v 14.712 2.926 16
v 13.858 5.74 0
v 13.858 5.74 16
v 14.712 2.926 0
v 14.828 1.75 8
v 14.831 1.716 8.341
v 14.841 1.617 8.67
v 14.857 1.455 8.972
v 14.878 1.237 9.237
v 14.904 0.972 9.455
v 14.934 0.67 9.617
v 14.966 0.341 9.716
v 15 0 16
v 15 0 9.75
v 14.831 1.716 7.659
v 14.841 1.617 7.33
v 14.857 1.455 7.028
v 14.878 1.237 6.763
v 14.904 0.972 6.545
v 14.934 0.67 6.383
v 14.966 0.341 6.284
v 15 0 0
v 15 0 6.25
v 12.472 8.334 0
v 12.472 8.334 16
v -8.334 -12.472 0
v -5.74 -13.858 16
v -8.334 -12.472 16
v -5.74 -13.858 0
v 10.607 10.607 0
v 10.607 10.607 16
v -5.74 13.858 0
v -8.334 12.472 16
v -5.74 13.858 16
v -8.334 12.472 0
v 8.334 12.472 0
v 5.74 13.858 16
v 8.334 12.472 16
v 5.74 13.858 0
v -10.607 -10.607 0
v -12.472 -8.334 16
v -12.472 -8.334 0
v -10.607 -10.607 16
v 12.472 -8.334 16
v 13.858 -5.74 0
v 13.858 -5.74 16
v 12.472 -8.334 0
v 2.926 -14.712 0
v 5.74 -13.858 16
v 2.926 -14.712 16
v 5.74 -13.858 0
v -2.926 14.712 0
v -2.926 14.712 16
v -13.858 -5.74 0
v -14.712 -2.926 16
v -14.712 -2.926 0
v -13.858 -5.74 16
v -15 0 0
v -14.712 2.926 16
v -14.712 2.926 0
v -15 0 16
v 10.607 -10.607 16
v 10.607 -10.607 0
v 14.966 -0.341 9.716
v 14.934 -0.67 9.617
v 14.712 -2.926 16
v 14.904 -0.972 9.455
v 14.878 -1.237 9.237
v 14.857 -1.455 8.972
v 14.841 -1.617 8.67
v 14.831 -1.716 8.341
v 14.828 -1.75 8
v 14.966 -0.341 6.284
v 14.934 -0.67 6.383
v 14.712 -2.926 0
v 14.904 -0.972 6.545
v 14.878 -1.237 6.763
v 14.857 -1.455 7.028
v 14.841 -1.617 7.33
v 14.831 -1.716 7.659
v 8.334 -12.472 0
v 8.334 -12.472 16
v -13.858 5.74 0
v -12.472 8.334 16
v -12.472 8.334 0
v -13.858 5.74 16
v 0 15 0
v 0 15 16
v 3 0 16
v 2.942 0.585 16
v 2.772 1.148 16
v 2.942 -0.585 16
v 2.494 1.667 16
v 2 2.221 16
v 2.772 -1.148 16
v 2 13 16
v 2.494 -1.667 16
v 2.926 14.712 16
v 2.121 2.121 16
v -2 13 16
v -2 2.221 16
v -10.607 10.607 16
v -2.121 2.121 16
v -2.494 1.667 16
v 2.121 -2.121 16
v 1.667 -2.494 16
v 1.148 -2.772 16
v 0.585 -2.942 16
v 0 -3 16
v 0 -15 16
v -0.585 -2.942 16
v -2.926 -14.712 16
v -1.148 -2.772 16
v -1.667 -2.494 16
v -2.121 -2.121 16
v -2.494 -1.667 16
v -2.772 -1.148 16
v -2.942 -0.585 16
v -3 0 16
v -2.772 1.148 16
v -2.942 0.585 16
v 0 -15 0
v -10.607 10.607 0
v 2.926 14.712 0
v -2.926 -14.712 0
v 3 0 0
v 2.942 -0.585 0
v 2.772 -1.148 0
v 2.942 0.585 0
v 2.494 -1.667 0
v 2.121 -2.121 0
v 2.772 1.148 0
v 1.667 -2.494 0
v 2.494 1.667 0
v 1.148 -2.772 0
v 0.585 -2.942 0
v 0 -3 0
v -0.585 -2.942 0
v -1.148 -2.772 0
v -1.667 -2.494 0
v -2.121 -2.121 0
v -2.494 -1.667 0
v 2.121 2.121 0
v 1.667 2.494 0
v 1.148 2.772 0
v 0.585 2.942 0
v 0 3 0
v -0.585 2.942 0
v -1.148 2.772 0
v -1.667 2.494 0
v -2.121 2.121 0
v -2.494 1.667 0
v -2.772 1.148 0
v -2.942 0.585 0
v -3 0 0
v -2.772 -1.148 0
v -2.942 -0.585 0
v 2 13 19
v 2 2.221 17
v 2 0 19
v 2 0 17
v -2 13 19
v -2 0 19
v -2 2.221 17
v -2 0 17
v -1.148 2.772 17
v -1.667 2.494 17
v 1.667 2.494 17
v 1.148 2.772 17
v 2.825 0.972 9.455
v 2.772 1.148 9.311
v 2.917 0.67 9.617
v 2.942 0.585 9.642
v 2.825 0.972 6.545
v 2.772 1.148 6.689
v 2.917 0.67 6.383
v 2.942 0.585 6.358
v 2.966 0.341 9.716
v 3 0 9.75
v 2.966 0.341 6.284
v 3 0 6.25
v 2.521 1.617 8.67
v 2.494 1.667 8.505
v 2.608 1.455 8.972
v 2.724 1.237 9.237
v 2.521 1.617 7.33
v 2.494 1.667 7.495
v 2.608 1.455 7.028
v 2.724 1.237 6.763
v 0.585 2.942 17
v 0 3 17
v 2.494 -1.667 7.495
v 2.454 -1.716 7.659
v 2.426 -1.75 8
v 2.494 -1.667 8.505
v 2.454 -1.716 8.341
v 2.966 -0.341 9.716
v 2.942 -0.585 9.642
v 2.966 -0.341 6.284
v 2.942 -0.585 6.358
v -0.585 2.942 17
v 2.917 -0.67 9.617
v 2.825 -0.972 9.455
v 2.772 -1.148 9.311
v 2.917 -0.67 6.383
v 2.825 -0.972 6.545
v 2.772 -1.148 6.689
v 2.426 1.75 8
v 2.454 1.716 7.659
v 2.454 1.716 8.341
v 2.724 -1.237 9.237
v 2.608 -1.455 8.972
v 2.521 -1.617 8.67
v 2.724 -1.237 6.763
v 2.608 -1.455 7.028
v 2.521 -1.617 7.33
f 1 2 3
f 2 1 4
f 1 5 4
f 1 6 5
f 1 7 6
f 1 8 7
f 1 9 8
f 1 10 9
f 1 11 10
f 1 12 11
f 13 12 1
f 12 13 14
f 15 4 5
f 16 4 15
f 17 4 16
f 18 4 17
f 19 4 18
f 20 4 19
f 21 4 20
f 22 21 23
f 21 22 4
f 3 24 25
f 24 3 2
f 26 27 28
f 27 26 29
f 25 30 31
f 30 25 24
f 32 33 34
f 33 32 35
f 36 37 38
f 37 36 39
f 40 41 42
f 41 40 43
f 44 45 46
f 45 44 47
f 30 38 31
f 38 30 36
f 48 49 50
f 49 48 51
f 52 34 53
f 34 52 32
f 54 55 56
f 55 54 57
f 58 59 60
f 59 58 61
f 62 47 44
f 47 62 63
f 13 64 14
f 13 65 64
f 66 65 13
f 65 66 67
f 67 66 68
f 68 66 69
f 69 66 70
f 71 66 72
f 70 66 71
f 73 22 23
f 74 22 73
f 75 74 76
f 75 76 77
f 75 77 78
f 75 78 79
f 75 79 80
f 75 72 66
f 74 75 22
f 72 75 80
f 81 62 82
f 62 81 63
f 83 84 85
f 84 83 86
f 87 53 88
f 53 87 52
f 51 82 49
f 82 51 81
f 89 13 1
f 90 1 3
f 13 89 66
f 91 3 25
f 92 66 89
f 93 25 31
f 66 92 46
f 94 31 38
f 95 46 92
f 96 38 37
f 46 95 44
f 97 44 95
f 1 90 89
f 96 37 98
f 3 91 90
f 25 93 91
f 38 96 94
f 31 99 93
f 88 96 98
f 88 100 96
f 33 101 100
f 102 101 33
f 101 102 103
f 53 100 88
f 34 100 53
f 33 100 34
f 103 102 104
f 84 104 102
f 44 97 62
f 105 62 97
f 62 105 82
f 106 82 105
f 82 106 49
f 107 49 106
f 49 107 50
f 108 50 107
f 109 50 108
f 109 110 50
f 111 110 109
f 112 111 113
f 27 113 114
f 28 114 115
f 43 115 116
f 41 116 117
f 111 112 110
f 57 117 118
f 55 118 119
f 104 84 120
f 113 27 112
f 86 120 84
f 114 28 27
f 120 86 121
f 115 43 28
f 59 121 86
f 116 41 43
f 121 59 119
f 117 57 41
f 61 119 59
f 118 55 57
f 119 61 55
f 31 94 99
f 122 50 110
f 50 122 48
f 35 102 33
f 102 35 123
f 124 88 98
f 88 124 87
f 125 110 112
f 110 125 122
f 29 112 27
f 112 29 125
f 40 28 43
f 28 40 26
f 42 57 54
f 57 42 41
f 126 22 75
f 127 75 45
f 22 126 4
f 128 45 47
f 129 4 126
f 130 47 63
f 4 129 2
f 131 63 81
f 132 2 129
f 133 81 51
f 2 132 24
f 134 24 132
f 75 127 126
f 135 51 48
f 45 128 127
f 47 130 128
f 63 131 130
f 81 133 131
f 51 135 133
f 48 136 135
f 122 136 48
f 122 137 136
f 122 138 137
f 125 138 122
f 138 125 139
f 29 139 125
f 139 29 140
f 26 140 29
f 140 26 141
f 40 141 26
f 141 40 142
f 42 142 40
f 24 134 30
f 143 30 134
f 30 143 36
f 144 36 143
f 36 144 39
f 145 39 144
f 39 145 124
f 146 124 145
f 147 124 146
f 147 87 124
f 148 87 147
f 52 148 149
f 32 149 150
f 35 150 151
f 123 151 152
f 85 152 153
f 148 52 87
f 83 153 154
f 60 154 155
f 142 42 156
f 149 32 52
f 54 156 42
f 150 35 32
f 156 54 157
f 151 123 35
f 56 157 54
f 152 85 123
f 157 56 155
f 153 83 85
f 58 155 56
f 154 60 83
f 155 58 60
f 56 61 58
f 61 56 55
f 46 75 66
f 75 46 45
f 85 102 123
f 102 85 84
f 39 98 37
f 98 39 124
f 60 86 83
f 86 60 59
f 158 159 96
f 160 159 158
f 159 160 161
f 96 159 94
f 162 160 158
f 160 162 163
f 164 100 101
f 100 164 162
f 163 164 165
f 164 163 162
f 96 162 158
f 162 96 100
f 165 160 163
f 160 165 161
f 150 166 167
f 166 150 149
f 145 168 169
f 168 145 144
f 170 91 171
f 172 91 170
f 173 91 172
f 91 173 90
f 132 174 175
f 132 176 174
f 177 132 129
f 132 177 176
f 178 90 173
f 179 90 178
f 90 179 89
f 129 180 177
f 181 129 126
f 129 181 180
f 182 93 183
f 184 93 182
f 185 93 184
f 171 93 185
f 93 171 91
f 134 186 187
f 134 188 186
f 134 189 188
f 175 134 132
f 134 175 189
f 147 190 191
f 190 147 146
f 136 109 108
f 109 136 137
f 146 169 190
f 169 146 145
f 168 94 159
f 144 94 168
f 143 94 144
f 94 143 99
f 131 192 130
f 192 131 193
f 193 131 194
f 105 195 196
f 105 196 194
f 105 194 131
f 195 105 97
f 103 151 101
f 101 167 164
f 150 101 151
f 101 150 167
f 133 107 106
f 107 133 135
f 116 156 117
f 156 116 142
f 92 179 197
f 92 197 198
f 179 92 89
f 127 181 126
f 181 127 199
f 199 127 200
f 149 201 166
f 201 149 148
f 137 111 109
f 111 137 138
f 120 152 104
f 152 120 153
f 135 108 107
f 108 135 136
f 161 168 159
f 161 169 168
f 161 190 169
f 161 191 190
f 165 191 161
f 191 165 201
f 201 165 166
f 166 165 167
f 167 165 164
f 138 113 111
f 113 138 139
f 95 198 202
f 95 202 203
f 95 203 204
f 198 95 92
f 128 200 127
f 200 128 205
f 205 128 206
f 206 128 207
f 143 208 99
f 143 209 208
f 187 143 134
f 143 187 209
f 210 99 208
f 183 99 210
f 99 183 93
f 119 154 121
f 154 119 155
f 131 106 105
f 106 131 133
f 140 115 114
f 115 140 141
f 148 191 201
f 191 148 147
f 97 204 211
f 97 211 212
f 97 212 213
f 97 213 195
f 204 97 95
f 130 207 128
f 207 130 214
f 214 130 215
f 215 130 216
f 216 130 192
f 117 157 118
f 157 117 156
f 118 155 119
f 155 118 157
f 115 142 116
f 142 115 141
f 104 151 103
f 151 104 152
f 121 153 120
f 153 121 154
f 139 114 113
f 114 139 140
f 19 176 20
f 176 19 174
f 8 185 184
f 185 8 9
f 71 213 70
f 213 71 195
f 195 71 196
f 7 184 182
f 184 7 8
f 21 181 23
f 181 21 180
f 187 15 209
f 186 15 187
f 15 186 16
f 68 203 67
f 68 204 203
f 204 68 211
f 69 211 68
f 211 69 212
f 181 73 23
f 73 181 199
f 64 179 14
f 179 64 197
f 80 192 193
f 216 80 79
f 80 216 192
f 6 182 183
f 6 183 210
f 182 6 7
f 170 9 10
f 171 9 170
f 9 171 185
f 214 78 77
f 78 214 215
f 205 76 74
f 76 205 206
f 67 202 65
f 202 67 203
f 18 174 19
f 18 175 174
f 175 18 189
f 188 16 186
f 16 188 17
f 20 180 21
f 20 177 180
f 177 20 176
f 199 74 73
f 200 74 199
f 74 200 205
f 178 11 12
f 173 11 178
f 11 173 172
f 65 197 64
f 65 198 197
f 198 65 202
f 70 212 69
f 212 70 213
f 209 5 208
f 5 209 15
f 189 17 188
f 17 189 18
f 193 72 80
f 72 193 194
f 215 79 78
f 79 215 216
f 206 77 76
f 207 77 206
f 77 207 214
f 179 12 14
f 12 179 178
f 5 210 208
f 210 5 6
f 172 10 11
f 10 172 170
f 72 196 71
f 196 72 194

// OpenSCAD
$fn = 32;

// ----------------------------------------------------------------------
// Control knob: pointer knob
// ----------------------------------------------------------------------

// --- parameters (mm) ---
rib_w = 4;                // pointer rib width
rib_h = 4;                // pointer rib height
knob_d = 30;              // knob body diameter
knob_h = 16;              // knob body height
bore_d = 6;               // shaft bore diameter
set_d = 3.5;              // set screw bore diameter

rib_poke = rib_h - 1;  // rib height above the top
total_h = knob_h + rib_h - 1;  // overall height

difference() {
  union() {
    cylinder(h = knob_h, d = knob_d);
    translate([-rib_w / 2, 0, knob_h - 1])
      cube([rib_w, knob_d / 2 - 2, rib_h]);
  }
  translate([0, 0, -1]) cylinder(h = knob_h + 2, d = bore_d);
  translate([-1, 0, knob_h / 2]) rotate([0, 90, 0])
    cylinder(h = knob_d / 2 + bore_d / 2 + 2, d = set_d);}
